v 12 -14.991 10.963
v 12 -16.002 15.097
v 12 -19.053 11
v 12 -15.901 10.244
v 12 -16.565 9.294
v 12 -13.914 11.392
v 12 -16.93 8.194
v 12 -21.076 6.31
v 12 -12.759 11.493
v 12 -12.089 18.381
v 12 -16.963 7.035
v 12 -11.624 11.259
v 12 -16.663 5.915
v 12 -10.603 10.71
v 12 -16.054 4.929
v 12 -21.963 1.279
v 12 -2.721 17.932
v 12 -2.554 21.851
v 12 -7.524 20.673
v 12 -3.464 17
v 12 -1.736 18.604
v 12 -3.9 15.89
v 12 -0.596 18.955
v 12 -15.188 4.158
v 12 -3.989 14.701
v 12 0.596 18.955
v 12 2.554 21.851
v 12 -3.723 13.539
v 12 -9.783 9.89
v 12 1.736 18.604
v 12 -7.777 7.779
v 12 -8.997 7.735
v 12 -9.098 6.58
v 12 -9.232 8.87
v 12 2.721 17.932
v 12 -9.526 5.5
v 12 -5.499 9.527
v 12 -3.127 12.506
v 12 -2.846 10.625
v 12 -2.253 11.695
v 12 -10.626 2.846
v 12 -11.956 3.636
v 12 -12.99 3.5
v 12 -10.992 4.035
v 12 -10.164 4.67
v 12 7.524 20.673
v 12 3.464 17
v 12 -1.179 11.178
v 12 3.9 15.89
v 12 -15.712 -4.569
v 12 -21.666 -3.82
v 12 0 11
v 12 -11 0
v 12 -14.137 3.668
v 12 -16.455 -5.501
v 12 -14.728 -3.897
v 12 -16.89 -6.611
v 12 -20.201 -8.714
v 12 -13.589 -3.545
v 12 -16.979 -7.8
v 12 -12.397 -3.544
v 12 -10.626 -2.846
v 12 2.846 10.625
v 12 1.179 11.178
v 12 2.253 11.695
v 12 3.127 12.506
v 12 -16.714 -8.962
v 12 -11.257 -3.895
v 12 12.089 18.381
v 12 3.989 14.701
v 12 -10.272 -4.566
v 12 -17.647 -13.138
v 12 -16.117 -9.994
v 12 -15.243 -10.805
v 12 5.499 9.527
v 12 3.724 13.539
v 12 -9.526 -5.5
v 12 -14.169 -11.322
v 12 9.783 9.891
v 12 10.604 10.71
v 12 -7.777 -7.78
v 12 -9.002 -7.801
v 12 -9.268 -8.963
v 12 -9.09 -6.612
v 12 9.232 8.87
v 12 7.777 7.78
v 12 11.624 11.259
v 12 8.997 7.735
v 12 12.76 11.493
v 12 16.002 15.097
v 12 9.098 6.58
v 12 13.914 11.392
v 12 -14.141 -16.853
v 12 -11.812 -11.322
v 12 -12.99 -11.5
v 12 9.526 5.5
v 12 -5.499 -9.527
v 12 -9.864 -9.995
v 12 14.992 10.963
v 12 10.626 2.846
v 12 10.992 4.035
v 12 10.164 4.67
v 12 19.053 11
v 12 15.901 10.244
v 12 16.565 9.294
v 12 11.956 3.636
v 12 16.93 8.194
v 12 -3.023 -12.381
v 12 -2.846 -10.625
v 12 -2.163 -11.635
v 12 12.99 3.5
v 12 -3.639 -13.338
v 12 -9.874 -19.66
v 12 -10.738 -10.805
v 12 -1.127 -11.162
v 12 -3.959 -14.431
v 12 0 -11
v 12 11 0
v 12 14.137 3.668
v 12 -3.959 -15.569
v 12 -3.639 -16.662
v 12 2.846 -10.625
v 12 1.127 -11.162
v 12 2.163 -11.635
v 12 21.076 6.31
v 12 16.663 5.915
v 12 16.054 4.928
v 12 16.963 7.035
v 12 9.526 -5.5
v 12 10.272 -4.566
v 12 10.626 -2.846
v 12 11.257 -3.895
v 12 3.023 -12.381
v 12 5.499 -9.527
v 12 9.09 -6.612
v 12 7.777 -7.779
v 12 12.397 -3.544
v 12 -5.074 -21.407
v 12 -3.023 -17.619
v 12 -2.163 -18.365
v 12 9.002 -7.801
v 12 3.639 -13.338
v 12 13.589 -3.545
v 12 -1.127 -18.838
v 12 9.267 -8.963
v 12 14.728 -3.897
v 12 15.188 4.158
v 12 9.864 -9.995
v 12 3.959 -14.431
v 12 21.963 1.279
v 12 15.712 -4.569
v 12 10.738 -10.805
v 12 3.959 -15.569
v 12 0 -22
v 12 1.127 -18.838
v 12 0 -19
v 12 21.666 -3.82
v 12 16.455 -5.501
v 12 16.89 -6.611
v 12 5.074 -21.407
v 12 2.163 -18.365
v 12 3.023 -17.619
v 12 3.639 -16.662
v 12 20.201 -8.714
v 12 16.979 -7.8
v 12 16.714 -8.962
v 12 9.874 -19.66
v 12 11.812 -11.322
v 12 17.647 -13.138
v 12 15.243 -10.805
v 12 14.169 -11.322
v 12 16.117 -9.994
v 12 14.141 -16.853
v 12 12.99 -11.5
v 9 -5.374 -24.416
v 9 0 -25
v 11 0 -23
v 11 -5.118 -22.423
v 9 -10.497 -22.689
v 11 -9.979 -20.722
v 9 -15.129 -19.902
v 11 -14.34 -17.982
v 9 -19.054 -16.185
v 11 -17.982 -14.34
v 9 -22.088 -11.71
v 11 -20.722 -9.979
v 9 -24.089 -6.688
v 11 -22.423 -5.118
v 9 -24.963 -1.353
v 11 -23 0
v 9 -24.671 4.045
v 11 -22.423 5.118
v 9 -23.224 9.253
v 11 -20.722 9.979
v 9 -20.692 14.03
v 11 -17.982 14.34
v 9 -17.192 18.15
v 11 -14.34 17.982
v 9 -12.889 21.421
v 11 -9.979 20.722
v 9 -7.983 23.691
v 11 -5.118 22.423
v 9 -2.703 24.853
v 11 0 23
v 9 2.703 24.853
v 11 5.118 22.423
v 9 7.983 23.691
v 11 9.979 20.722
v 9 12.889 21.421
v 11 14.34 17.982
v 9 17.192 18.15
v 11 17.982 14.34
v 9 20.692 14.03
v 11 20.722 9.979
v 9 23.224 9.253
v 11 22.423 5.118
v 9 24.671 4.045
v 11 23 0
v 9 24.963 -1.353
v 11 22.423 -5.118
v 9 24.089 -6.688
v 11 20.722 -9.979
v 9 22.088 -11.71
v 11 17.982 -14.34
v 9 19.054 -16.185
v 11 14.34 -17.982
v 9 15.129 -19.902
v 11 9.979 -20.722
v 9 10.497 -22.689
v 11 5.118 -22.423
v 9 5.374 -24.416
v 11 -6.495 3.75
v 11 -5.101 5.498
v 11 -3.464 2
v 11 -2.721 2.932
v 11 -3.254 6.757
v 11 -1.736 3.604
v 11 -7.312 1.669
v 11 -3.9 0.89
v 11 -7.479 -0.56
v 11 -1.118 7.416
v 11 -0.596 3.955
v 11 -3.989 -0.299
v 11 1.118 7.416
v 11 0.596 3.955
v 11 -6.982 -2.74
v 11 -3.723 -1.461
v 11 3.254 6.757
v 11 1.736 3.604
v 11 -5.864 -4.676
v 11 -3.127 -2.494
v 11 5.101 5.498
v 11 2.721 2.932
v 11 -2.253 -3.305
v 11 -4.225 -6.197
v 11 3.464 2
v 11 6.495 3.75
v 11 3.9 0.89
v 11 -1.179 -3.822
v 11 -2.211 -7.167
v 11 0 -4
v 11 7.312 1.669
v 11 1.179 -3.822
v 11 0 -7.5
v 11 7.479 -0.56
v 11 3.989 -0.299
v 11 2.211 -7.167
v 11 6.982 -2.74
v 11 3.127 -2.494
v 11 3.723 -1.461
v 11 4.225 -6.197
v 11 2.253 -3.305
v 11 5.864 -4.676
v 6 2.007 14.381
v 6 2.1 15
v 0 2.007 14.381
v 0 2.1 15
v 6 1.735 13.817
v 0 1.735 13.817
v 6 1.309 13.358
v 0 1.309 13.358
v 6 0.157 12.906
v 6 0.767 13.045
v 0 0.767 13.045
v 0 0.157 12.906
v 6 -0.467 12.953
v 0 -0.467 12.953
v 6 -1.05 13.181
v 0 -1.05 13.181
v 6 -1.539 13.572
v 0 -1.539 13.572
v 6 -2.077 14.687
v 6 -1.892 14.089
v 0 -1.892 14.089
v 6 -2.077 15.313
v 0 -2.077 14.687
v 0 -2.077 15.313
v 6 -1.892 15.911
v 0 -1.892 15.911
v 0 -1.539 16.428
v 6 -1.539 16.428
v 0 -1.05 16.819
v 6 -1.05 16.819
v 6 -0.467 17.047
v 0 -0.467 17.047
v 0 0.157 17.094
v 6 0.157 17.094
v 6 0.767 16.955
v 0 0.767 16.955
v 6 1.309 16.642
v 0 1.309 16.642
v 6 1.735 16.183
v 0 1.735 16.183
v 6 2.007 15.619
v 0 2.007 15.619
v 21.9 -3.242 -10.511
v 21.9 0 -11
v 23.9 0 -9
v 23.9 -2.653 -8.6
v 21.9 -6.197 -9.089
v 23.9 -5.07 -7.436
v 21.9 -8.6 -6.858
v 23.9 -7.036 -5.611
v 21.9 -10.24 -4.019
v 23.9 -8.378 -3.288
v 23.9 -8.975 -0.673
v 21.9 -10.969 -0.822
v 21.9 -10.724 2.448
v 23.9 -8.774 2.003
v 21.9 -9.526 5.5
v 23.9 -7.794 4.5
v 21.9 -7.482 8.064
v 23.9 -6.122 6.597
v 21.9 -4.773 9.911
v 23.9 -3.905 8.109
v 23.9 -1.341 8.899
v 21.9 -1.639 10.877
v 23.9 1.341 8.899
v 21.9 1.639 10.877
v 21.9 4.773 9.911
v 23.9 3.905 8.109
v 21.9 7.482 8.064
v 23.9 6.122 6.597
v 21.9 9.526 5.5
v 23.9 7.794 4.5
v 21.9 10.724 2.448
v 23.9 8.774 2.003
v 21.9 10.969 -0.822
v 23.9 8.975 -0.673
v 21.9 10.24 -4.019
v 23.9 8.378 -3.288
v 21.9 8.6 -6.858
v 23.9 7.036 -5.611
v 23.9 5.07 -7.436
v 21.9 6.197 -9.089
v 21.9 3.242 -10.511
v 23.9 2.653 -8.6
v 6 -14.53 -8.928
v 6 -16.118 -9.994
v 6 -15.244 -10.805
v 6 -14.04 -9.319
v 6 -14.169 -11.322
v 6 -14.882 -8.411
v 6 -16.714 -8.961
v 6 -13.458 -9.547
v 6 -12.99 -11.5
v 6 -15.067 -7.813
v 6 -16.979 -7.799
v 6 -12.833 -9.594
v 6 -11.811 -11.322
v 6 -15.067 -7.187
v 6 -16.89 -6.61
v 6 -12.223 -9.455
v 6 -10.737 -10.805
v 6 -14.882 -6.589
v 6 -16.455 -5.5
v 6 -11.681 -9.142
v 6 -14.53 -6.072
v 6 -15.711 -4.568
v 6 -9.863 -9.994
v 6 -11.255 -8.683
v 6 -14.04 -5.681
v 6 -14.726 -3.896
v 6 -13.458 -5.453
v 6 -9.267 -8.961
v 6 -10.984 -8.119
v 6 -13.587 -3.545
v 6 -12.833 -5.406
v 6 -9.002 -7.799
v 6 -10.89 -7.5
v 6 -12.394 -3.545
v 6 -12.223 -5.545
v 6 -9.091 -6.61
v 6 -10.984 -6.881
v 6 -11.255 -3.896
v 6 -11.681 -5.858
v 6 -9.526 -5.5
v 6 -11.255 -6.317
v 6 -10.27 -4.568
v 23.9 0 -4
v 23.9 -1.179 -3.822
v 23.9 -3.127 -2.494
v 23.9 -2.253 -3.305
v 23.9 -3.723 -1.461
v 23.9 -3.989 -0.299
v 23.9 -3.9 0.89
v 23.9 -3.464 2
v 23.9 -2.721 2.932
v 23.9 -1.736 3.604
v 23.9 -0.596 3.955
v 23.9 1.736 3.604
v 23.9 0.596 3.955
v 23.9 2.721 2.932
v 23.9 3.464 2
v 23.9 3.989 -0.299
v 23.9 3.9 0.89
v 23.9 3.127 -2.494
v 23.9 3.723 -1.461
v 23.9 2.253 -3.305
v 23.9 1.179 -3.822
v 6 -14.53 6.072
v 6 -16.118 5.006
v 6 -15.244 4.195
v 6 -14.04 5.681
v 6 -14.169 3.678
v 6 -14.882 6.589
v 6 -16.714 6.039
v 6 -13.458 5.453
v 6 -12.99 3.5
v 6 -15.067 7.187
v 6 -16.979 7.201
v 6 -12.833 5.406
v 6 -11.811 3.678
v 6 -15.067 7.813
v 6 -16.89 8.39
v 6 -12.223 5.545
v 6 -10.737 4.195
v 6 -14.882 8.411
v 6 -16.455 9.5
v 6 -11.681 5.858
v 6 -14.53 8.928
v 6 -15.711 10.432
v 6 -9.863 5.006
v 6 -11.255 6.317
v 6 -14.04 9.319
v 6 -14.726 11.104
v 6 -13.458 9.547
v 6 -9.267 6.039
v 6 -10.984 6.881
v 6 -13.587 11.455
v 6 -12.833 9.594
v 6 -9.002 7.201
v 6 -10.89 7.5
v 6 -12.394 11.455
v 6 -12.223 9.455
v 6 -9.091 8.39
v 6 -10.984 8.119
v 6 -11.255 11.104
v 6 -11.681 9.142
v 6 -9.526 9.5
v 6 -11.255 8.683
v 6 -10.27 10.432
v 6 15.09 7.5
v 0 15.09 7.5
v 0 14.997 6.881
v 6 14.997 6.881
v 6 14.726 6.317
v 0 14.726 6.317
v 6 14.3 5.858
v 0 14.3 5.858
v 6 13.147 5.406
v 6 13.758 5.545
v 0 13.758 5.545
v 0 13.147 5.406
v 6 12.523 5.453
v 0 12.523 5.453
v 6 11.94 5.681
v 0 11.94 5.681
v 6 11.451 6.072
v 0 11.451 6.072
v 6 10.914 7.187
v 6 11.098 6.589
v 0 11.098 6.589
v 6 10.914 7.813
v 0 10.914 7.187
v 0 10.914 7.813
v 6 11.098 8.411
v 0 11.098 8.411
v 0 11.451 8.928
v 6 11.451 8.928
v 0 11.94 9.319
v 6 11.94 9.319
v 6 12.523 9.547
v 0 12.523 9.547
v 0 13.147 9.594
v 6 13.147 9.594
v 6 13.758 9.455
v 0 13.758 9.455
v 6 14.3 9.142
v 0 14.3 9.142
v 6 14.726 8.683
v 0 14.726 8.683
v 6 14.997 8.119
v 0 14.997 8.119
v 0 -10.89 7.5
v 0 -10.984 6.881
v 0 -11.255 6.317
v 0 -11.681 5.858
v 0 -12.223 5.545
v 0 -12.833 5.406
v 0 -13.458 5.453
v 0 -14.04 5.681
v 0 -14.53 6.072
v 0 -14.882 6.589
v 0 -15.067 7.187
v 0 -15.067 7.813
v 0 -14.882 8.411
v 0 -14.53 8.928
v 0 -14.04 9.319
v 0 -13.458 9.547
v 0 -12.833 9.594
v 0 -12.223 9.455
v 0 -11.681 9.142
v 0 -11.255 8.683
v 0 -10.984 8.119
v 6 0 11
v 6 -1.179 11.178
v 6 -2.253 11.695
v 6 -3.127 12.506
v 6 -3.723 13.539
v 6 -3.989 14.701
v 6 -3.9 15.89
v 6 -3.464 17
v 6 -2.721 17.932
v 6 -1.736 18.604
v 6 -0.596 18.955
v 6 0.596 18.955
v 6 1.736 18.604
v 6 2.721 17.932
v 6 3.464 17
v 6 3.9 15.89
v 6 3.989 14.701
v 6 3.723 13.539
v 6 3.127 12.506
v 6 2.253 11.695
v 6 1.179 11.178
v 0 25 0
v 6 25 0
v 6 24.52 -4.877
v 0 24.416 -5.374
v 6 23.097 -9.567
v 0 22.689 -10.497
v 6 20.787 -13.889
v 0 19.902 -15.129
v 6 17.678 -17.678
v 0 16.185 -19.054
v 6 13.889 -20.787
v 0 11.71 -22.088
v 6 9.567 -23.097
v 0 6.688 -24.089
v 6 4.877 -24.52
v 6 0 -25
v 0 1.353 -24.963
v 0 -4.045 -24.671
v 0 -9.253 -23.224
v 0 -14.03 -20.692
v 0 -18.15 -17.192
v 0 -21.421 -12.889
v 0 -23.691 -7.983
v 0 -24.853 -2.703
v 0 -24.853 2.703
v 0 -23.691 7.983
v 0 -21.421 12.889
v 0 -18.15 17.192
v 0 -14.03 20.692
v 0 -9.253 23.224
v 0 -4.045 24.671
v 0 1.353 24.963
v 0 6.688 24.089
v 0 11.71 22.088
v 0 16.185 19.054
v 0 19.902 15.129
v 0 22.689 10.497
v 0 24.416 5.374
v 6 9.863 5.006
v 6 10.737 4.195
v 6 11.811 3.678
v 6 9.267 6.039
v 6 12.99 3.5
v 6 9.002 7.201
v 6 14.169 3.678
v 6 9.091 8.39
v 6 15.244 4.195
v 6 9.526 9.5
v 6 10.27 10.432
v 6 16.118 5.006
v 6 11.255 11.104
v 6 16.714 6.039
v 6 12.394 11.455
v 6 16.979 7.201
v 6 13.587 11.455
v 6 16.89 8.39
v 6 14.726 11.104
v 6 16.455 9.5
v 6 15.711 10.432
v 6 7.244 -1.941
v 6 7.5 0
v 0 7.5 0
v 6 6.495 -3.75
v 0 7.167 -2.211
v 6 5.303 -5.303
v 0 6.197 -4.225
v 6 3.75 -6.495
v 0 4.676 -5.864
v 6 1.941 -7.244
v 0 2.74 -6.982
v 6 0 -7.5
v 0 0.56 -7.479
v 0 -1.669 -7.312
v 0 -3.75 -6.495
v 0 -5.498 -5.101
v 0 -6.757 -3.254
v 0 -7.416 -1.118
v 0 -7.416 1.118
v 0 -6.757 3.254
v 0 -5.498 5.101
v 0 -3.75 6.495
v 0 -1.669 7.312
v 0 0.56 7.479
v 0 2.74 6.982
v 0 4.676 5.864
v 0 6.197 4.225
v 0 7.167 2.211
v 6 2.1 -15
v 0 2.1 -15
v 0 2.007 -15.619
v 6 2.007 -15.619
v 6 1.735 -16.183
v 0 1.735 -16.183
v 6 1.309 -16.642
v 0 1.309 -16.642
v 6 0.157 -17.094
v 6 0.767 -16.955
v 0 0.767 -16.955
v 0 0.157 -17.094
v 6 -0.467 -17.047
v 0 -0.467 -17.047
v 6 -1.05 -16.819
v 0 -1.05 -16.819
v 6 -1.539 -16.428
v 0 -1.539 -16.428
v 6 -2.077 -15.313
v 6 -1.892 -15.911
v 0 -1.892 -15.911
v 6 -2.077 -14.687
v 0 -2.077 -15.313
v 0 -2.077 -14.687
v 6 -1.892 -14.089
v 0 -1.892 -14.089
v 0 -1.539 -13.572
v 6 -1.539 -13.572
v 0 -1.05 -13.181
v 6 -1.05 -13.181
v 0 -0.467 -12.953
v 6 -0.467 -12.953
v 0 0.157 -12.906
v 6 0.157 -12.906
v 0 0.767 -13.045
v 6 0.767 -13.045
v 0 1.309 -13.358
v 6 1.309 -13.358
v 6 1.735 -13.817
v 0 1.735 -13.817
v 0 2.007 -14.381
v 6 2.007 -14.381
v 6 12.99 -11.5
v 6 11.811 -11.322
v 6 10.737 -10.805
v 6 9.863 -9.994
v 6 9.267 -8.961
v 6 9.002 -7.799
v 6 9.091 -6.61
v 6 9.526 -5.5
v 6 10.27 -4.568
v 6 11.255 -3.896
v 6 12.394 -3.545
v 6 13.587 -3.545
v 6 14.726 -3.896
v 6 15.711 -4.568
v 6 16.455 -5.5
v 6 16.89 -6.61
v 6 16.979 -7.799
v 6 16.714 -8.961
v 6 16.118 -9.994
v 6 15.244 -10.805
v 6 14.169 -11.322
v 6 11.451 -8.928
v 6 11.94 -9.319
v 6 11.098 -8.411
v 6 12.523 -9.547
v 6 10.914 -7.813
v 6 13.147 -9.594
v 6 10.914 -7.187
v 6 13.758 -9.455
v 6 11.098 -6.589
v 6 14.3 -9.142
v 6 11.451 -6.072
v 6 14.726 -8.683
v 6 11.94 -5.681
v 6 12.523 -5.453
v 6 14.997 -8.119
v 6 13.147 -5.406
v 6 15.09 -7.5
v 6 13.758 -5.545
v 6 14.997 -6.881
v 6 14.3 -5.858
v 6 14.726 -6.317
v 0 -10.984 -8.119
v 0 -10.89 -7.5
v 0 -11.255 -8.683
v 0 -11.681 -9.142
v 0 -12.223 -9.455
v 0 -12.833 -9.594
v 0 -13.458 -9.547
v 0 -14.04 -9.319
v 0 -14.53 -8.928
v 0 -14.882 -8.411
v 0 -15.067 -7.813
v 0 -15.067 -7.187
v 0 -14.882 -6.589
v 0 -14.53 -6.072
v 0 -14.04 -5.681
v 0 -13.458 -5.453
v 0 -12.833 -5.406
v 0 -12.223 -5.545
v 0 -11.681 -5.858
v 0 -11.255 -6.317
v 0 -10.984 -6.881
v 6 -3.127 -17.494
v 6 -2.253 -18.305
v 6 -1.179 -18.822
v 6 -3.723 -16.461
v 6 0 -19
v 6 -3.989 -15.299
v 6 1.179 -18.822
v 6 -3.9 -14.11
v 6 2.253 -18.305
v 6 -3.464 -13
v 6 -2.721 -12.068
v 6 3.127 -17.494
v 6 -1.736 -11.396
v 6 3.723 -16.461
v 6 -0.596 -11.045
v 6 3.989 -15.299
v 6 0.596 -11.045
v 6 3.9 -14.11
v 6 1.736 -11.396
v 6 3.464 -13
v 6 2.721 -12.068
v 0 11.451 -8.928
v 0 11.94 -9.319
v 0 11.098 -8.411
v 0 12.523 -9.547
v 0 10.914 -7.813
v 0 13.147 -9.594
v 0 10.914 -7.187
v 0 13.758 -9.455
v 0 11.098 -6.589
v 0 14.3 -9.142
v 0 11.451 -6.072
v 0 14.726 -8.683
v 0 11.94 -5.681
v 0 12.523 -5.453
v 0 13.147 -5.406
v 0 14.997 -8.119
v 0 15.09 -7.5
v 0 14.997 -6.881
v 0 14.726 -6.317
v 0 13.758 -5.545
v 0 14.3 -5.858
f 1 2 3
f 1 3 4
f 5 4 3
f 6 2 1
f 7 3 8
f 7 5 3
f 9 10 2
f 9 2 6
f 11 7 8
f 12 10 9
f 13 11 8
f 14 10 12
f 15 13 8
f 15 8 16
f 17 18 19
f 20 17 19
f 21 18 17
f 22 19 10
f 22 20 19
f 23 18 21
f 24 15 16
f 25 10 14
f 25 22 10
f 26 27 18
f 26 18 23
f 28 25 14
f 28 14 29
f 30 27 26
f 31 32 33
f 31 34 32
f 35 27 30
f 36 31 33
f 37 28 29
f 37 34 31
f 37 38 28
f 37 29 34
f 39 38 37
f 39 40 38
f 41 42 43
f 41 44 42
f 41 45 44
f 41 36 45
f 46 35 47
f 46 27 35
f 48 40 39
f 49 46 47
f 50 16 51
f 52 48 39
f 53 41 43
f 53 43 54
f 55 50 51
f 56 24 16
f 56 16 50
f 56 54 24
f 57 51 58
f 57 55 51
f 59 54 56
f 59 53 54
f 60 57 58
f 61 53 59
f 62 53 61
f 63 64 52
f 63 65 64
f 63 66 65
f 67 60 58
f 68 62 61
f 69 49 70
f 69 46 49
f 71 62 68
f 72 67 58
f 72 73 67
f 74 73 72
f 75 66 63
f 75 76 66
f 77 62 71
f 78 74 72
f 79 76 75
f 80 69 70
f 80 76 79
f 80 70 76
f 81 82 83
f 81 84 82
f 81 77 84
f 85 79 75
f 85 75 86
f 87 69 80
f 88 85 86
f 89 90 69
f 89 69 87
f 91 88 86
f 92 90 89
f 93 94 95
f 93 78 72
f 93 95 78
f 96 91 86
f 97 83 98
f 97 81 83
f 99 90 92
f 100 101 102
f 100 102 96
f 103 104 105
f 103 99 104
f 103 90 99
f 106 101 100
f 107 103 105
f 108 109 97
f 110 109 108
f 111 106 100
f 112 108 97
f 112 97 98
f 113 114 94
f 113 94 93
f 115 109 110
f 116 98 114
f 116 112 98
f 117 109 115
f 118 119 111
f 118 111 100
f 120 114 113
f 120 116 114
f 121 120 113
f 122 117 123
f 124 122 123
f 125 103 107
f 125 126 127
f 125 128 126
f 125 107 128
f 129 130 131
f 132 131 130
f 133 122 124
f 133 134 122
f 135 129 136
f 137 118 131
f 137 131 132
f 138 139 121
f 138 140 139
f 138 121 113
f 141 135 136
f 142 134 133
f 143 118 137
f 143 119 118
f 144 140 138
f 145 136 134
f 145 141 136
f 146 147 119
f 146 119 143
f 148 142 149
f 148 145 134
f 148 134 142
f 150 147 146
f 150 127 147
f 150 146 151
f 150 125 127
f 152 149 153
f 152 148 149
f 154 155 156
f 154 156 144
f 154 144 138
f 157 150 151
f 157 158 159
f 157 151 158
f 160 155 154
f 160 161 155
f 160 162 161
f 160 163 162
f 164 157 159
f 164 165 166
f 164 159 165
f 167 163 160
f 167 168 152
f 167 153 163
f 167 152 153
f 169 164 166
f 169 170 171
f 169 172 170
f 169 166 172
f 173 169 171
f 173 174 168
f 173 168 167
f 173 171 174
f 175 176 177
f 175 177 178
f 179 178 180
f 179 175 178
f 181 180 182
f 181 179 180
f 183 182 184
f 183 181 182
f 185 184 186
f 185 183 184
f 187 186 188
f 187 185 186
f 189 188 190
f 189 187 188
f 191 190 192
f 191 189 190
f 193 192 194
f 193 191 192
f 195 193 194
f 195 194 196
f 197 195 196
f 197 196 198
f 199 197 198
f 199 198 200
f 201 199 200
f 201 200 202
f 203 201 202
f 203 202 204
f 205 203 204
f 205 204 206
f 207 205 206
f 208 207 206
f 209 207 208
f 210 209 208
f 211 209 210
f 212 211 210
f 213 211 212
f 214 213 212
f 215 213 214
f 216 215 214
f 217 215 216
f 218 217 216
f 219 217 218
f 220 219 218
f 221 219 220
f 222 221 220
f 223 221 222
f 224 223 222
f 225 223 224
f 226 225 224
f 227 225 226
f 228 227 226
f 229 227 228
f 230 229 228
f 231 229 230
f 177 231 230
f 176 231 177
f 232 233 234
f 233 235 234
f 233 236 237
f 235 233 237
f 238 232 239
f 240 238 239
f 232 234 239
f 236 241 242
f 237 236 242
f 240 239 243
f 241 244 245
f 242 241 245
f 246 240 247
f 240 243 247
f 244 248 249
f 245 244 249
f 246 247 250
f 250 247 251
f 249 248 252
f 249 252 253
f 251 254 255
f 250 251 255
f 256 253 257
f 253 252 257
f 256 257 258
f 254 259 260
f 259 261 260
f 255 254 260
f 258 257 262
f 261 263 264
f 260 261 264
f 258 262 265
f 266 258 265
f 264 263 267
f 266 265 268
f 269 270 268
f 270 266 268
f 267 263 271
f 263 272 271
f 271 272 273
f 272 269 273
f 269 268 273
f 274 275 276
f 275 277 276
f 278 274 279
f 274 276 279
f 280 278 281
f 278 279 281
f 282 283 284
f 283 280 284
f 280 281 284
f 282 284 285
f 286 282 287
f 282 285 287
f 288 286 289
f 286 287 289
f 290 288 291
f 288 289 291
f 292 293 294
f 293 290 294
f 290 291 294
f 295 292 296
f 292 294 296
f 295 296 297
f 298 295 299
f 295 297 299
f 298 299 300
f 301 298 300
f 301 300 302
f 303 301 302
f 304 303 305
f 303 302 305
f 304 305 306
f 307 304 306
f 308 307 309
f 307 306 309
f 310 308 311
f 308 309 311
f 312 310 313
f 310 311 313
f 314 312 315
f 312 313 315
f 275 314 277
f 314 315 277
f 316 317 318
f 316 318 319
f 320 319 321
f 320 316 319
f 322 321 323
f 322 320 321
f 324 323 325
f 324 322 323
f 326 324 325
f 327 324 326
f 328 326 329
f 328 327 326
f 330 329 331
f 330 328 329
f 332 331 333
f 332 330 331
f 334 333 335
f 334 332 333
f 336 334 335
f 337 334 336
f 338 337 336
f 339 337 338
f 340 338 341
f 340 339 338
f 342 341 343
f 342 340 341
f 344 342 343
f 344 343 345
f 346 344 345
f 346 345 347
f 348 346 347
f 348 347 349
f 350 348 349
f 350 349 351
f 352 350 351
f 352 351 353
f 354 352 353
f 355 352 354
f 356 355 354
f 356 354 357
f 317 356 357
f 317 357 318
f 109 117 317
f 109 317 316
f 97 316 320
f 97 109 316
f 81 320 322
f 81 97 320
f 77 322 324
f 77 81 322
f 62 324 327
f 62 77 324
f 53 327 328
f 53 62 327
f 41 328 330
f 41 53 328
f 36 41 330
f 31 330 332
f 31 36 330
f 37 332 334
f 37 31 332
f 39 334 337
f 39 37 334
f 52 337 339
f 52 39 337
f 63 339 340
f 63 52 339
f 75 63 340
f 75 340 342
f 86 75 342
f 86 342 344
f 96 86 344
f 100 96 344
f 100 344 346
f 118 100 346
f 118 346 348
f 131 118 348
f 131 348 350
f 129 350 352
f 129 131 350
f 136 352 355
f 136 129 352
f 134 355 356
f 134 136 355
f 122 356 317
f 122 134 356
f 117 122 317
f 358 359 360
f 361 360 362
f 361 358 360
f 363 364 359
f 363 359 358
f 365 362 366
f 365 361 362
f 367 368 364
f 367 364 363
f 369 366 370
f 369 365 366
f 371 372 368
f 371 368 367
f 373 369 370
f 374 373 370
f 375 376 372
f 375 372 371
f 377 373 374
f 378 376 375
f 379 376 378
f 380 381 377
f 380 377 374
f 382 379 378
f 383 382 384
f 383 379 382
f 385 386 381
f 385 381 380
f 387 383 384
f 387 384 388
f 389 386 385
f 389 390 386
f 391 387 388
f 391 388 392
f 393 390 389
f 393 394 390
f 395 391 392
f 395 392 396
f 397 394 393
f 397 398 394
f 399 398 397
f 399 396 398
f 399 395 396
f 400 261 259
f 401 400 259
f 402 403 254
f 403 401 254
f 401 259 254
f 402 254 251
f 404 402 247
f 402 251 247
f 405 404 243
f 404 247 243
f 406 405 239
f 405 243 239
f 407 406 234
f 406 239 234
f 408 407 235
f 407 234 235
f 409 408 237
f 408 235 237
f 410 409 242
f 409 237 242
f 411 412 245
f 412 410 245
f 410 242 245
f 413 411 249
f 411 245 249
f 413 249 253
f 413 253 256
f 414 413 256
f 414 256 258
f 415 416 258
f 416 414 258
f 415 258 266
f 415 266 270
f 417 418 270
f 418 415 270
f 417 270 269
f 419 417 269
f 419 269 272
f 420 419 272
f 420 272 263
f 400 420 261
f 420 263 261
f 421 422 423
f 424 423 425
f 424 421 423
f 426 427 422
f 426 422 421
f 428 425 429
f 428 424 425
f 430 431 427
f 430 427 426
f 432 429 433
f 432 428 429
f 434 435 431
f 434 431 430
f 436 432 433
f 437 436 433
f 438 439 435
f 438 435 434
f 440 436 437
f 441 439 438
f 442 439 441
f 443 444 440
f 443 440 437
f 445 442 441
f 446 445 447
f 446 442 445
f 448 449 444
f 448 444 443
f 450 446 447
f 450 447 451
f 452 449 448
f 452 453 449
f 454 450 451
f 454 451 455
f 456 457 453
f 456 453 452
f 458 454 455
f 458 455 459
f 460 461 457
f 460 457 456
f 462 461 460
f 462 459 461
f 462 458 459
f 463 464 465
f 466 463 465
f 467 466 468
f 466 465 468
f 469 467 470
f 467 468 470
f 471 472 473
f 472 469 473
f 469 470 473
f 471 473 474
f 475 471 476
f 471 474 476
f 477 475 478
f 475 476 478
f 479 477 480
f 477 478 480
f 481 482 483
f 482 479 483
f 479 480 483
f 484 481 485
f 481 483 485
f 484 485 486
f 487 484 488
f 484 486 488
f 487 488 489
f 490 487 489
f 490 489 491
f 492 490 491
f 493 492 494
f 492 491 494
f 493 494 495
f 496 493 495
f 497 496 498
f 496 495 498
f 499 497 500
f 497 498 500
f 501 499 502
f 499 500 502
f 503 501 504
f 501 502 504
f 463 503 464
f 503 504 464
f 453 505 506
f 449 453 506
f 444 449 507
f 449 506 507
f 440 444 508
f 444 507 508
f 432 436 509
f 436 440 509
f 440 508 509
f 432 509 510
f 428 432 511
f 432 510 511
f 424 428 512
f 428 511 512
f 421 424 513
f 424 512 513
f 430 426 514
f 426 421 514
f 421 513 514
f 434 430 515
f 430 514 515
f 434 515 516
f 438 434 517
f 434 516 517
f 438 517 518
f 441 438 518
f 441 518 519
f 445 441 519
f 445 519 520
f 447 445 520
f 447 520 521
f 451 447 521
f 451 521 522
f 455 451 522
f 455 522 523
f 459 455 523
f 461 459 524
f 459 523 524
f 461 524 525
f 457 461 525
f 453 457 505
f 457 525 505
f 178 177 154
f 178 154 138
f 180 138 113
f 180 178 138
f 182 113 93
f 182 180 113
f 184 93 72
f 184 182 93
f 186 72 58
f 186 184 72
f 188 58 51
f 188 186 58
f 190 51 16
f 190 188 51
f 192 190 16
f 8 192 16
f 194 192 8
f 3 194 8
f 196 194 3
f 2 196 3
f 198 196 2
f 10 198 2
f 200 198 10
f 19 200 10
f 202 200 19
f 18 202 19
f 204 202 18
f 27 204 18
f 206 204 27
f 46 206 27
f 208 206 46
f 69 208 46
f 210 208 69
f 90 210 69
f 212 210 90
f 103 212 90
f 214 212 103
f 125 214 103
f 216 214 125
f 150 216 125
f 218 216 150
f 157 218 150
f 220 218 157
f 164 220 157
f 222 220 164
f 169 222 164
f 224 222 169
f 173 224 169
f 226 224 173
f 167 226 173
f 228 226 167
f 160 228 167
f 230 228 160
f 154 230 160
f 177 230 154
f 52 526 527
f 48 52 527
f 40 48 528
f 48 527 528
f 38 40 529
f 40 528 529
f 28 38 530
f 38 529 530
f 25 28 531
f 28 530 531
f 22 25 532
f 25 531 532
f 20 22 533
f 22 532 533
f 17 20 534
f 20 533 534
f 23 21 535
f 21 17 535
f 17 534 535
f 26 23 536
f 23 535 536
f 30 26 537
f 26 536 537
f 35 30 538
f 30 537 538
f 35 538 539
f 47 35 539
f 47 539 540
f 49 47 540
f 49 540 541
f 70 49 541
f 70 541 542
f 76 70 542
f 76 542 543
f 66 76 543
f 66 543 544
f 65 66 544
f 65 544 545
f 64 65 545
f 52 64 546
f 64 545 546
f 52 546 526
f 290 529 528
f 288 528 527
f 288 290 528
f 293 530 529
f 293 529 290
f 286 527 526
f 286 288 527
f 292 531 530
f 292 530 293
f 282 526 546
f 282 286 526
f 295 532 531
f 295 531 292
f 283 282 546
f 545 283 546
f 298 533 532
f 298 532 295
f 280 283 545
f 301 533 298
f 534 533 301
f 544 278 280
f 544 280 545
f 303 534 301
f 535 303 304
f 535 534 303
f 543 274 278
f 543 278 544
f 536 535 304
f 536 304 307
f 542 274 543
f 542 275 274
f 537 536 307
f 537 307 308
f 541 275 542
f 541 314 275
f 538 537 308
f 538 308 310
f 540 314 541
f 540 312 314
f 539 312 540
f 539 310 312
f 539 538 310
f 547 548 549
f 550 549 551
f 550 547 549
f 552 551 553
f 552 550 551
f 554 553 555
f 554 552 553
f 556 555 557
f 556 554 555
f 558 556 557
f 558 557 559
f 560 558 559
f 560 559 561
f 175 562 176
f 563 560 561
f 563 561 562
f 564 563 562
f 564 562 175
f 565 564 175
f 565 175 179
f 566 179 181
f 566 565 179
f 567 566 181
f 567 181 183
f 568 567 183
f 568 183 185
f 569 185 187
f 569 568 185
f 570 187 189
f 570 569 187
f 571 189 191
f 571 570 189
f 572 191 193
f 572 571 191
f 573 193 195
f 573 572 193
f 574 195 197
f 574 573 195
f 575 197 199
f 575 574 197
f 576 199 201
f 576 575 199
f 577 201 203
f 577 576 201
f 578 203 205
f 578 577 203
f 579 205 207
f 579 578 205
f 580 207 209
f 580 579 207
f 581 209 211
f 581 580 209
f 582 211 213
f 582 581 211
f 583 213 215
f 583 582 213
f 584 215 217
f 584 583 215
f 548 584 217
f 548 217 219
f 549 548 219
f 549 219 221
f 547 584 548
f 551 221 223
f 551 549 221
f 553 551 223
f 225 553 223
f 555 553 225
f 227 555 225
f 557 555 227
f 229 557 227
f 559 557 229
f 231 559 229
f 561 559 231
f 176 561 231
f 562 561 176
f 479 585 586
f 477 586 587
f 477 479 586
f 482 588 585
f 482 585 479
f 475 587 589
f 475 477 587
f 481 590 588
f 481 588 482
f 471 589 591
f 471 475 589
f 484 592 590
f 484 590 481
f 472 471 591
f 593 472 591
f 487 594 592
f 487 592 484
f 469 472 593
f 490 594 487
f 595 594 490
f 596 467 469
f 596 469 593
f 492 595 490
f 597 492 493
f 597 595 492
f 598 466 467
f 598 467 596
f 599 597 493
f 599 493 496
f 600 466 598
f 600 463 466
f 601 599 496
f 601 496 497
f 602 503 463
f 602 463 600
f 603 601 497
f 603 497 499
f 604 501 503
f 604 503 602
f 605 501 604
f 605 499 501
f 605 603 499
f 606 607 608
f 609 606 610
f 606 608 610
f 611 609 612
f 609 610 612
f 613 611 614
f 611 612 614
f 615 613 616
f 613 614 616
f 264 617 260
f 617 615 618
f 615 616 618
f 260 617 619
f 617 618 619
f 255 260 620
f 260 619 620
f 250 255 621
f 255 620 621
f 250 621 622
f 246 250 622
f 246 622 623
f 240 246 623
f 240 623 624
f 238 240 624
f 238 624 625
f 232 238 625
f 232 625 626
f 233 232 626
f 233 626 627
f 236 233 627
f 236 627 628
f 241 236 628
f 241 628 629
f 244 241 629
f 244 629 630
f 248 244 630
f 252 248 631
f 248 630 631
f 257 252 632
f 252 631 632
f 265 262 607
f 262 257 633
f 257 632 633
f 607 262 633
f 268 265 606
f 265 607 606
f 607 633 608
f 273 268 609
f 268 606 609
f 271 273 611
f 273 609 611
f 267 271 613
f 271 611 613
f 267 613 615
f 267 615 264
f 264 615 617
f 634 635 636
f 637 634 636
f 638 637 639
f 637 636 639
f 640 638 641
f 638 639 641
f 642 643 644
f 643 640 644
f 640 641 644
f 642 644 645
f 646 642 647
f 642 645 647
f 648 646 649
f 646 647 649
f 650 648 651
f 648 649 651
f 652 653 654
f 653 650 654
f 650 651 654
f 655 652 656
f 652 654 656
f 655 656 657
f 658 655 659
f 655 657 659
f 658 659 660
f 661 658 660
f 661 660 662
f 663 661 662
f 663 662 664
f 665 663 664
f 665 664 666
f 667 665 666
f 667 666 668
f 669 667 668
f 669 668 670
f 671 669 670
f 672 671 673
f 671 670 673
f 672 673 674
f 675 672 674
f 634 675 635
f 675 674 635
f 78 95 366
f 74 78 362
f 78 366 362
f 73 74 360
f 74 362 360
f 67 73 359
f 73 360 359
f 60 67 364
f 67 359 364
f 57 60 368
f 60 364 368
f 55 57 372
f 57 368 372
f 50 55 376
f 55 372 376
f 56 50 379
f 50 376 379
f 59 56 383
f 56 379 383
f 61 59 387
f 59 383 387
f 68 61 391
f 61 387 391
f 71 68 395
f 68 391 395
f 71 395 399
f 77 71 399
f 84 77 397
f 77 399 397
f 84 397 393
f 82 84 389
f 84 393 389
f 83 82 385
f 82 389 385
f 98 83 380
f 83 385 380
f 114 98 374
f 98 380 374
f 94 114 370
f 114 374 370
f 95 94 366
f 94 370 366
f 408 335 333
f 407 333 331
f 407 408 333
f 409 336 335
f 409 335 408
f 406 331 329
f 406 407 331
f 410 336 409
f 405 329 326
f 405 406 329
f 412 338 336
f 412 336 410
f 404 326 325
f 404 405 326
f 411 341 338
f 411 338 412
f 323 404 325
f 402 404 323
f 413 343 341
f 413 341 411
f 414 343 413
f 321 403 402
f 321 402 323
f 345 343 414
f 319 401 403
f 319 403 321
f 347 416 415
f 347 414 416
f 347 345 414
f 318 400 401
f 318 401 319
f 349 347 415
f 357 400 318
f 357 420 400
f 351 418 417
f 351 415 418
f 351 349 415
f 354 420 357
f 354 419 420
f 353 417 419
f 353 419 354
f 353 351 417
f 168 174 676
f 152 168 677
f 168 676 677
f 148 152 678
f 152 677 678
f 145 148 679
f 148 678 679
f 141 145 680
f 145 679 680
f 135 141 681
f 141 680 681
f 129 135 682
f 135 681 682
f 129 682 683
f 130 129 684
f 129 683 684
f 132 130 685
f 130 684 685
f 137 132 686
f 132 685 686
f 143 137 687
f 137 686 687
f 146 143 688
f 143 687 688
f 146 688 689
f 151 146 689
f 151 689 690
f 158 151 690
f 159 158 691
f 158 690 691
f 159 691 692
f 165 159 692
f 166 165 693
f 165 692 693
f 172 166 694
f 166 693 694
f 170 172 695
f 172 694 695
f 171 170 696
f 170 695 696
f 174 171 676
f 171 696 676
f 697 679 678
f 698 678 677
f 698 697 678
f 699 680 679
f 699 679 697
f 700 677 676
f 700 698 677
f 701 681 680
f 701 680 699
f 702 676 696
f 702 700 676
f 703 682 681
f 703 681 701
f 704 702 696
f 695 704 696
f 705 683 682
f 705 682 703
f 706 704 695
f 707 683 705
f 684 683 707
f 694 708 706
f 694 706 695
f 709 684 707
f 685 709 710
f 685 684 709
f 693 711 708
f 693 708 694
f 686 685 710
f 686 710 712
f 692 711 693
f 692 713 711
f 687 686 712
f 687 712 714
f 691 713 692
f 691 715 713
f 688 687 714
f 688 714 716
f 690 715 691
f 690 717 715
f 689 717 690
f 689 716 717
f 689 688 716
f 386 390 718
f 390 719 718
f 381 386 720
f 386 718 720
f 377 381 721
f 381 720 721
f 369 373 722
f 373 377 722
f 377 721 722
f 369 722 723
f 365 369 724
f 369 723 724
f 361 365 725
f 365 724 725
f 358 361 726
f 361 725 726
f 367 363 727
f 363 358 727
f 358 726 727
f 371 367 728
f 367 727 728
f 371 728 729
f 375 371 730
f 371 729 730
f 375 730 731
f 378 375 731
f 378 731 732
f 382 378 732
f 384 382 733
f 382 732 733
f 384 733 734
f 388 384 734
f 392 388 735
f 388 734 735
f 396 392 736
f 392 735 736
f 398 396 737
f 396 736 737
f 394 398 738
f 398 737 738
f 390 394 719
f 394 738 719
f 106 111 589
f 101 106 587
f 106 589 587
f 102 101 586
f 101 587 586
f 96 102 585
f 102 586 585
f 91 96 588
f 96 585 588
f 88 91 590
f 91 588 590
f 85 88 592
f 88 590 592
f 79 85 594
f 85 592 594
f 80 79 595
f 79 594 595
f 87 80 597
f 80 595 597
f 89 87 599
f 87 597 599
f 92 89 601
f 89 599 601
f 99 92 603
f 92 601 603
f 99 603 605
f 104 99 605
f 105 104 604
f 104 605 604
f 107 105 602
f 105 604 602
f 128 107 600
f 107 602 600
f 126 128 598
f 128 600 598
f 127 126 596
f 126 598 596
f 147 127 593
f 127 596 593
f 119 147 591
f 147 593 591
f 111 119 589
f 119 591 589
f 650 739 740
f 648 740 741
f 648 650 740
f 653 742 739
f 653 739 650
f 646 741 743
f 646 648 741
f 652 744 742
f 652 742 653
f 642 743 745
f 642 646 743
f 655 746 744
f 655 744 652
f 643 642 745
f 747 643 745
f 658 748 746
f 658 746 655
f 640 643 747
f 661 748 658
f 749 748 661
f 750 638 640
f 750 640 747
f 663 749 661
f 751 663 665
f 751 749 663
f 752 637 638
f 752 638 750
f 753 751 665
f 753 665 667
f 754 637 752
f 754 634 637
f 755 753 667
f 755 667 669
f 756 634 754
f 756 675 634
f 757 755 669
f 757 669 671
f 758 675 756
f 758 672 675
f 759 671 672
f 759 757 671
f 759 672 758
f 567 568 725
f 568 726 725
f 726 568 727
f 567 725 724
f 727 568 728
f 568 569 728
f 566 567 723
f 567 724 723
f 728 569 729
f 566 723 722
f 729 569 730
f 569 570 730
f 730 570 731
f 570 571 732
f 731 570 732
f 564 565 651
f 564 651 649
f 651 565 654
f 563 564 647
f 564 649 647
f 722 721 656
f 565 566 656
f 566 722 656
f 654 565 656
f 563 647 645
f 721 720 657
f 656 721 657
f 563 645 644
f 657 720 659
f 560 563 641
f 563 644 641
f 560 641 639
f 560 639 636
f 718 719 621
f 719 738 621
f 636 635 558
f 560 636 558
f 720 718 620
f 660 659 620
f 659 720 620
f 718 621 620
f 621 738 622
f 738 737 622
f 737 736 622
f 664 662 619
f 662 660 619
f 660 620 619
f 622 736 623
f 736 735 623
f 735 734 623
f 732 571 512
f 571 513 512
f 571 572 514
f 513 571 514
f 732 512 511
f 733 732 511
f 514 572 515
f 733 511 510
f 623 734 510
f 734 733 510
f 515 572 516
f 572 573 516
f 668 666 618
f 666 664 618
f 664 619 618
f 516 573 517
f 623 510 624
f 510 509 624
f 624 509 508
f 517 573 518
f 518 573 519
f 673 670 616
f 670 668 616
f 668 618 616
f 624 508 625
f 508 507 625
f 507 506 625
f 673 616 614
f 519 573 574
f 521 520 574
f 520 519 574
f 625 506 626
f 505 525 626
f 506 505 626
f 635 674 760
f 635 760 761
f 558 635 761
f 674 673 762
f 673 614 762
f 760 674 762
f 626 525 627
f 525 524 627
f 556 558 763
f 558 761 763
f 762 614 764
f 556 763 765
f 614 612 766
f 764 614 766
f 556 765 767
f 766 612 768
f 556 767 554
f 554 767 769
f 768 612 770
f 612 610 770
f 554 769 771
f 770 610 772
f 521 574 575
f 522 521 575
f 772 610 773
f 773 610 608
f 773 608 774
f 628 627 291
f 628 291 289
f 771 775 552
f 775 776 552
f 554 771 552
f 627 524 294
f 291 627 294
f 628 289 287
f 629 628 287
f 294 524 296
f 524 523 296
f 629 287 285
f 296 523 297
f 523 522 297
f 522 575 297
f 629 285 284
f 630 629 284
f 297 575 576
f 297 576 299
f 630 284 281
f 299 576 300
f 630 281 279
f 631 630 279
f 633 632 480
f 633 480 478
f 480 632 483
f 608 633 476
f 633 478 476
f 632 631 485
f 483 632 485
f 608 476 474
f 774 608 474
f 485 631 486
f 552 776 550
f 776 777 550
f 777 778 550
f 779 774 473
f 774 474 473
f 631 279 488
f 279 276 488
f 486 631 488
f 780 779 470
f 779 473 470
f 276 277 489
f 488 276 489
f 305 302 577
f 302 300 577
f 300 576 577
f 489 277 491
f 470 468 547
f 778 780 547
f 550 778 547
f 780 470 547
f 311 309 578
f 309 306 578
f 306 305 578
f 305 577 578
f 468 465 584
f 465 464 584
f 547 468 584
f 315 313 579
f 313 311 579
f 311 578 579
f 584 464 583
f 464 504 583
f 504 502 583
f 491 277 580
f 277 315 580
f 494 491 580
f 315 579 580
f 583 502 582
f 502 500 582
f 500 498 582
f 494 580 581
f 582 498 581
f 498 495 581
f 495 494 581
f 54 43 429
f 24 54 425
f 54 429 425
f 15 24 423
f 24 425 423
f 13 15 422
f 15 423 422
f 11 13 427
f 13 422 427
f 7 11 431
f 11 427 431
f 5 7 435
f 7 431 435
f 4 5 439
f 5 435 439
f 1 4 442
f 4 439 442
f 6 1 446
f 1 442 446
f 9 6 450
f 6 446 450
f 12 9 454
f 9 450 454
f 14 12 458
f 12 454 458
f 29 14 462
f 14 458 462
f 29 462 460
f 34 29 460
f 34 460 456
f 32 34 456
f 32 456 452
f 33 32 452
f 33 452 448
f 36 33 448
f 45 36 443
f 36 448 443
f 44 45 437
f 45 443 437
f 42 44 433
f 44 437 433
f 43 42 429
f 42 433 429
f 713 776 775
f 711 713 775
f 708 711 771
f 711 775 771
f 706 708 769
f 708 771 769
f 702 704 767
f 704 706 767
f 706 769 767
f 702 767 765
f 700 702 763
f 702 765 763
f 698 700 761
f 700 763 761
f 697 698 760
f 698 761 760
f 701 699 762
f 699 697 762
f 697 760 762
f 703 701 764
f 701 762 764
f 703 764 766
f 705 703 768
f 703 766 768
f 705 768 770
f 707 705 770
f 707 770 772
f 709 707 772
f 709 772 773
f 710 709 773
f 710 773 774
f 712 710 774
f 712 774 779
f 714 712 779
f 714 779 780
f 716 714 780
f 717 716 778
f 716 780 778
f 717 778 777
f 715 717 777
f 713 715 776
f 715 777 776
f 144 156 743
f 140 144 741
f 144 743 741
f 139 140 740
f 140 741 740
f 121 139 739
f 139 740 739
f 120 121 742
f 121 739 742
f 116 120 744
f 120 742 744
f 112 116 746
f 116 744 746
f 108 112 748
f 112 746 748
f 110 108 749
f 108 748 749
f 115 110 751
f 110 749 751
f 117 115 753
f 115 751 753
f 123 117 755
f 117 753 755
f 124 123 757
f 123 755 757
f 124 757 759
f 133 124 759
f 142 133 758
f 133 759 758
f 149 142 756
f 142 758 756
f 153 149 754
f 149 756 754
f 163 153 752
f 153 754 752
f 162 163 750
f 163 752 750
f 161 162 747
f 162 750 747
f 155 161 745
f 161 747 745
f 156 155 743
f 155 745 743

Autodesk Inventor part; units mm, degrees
ref_plane "YZ Plane" through (0, 0, 0) normal (1, 0, 0) x (0, 1, 0)
ref_plane "XZ Plane" through (0, 0, 0) normal (0, 1, 0) x (-1, 0, 0)
ref_plane "XY Plane" through (0, 0, 0) normal (0, 0, 1) x (1, 0, 0)
sketch "草图1" plane through (0, 0, 0) normal (1, 0, 0) x (0, 1, 0)
  circle A0 centre (0, 0) radius 25
  circle A1 centre (0, 0) radius 7.5
  circle A2 centre (0, 0) radius 15 construction
  circle A3 centre (0, -15) radius 2.1
  line L0 (0, 0) -> (0, -7.5) construction
  circle A4 centre (12.9904, -7.5) radius 2.1
  circle A5 centre (12.9904, 7.5) radius 2.1
  circle A6 centre (0, 15) radius 2.1
  circle A7 centre (-12.9904, 7.5) radius 2.1
  circle A8 centre (-12.9904, -7.5) radius 2.1
  dimension "d1" = 15
  dimension "d4" = 30
  dimension "d0" = 50
  dimension "d5" = 4.2
  dimension "d8" = 360
extrude "拉伸1" add sketch "草图1" along normal blind 6
sketch "草图2" plane through (6, 0, 0) normal (1, 0, 0) x (0, 0, -1)
  circle A0 centre (0, 0) radius 25 projected
  circle A1 centre (7.5, 12.9904) radius 2.1 projected
  circle A2 centre (15, 0) radius 2.1 projected
  circle A3 centre (7.5, -12.9904) radius 2.1 projected
  circle A4 centre (-7.5, -12.9904) radius 2.1 projected
  circle A5 centre (0, 0) radius 7.5 projected
  circle A6 centre (-15, 0) radius 2.1 projected
  circle A7 centre (-7.5, 12.9904) radius 2.1 projected
  circle A8 centre (15, 0) radius 4
  circle A9 centre (7.5, 12.9904) radius 4
  circle A10 centre (-7.5, 12.9904) radius 4
  circle A11 centre (-15, 0) radius 4
  circle A12 centre (-7.5, -12.9904) radius 4
  circle A13 centre (7.5, -12.9904) radius 4
  dimension "d10" = 8
  dimension "d13" = 360
extrude "拉伸2" add sketch "草图2" along normal blind 5 contours A0
sketch "草图3" plane through (11, 0, 0) normal (1, 0, 0) x (0, 0, -1)
  circle A0 centre (0, 0) radius 4
  circle A1 centre (0, 0) radius 25 projected
  circle A2 centre (7.5, -12.9904) radius 4 projected
  circle A3 centre (15, 0) radius 4 projected
  circle A4 centre (7.5, 12.9904) radius 4 projected
  circle A5 centre (-7.5, 12.9904) radius 4 projected
  circle A6 centre (-15, 0) radius 4 projected
  circle A7 centre (-7.5, -12.9904) radius 4 projected
  circle A8 centre (0, 0) radius 11
  dimension "d17" = 8
extrude "拉伸3" add sketch "草图3" along normal blind 12.9 contours A8
chamfer "倒角1" distance 2 angle 45 1 edges at (23.9, 0, 11)
chamfer "倒角2" distance 2 angle 45 1 edges at (11, 0, 25)
sketch "草图4" plane through (11, 0, 0) normal (1, 0, 0) x (0, 0, -1)
  circle A0 centre (-15, 0) radius 4 projected
  arc A1 (-5.5, 9.5263) -> (-11, 0) centre (0, 0) ccw projected
  circle A2 centre (-7.5, 12.9904) radius 4 projected
  arc A3 (5.5, 9.5263) -> (-5.5, 9.5263) centre (0, 0) ccw projected
  circle A4 centre (7.5, 12.9904) radius 4 projected
  arc A5 (11, 0) -> (5.5, 9.5263) centre (0, 0) ccw projected
  circle A6 centre (15, 0) radius 4 projected
  arc A7 (5.5, -9.5263) -> (11, 0) centre (0, 0) ccw projected
  circle A8 centre (7.5, -12.9904) radius 4 projected
  arc A9 (-5.5, -9.5263) -> (5.5, -9.5263) centre (0, 0) ccw projected
  circle A10 centre (-7.5, -12.9904) radius 4 projected
  arc A11 (-11, 0) -> (-5.5, -9.5263) centre (0, 0) ccw projected
  circle A12 centre (0, 0) radius 23 projected
extrude "拉伸4" add sketch "草图4" along normal blind 1
chamfer "倒角3" distance 1 angle 45 1 edges at (12, 0, 23)
properties part number "导轮架"
